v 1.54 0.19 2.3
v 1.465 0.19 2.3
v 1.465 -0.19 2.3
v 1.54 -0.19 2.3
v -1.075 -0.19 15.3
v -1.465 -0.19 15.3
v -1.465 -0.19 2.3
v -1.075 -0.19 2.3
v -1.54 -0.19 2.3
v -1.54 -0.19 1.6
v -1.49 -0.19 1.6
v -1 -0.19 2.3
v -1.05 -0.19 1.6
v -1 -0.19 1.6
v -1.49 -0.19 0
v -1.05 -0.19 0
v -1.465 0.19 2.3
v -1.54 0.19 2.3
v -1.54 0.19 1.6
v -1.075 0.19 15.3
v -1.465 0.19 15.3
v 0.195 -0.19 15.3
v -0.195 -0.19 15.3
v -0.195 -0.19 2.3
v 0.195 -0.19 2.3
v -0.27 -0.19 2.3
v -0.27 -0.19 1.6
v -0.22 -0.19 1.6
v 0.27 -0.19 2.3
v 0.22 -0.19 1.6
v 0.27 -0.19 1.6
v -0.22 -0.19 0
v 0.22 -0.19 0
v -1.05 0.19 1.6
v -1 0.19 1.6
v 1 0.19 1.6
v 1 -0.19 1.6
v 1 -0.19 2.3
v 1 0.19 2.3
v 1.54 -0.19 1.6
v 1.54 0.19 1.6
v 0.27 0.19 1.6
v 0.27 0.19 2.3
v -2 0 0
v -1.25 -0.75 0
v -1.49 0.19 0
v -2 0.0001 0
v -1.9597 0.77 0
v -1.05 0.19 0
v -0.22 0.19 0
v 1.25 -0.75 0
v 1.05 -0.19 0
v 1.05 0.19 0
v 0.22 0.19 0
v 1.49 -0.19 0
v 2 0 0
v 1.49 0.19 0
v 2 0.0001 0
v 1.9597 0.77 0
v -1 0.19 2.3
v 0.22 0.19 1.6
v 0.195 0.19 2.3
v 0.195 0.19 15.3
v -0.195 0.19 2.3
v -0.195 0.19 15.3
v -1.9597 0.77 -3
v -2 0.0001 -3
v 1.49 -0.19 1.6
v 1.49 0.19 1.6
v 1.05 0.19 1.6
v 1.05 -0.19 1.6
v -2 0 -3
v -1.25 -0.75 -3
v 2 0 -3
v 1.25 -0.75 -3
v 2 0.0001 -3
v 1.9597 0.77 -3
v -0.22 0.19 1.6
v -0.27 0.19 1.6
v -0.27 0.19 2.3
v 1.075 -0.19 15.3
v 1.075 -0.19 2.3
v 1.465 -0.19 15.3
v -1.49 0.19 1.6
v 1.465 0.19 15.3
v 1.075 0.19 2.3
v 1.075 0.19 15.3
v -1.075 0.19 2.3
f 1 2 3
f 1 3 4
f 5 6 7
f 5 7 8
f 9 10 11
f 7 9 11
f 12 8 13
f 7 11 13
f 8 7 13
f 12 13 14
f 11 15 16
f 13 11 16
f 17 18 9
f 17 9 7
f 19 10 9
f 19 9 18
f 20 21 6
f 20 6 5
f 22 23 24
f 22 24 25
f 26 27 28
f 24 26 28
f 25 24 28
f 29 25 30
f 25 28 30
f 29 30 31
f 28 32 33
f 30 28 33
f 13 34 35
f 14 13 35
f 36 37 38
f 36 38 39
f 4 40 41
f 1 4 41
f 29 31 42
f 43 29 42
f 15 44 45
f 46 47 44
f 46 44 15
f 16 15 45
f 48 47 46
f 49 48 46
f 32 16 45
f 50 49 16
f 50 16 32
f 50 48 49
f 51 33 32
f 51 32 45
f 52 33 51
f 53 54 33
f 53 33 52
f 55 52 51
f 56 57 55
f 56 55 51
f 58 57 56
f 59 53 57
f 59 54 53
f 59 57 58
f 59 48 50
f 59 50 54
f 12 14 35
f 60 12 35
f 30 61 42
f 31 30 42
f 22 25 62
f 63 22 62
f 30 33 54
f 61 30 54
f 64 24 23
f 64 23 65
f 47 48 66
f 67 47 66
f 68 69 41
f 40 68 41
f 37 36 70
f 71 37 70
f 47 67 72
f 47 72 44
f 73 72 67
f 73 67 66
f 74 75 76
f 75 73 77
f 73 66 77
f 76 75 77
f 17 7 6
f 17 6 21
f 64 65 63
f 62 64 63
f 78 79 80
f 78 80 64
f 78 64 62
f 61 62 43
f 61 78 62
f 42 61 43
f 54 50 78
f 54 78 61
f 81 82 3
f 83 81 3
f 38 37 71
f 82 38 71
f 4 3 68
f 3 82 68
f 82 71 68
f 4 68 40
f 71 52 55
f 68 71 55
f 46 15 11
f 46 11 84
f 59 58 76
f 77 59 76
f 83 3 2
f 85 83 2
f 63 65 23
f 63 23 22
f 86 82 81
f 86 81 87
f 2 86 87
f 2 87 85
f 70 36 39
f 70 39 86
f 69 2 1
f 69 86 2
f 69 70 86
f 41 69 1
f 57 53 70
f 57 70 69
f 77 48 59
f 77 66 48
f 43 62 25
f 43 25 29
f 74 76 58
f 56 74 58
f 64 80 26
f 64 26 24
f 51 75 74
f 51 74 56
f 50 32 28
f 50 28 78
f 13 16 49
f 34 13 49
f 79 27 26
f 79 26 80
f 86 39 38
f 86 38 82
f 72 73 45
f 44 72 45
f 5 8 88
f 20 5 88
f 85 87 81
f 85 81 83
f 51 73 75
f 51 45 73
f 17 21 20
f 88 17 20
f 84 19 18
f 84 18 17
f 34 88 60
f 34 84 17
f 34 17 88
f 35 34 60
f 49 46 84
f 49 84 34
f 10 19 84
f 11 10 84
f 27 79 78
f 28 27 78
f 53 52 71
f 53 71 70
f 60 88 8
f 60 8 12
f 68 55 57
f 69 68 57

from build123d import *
from OCP.BRepFilletAPI import BRepFilletAPI_MakeChamfer

# Parameters (mm, degrees)
SKETCH1_W           = 4
SKETCH1_H           = 3
BOSS_EXTRUDE1_DEPTH = 0.77
SKETCH3_W           = 4
SKETCH3_H           = 3
BOSS_EXTRUDE2_DEPTH = 0.75
CHAMFER1_SIZE       = 0.75
CHAMFER2_SIZE       = 0.77
CHAMFER2_SIZE_2     = 0.04035399
SKETCH4_W           = 0.44
SKETCH4_H           = 0.38
BOSS_EXTRUDE3_DEPTH = 1.6
SKETCH5_W           = 0.54
SKETCH5_H           = 0.38
BOSS_EXTRUDE4_DEPTH = 0.7
SKETCH6_W           = 0.39
SKETCH6_H           = 0.38
BOSS_EXTRUDE5_DEPTH = 13
LPATTERN1_COUNT     = 3
LPATTERN1_PITCH     = 1.27


with BuildPart() as part:
    # Sketch1 → Boss-Extrude1 (new body)
    with BuildSketch(Plane(origin=(0, 0, 0), x_dir=(1, 0, 0), z_dir=(0, 1, 0))):
        with Locations((0, 1.5)):
            Rectangle(SKETCH1_W, SKETCH1_H)
    extrude(amount=BOSS_EXTRUDE1_DEPTH)

    # Sketch3 → Boss-Extrude2 (add)
    with BuildSketch(Plane.XZ):
        with Locations((0, -1.5)):
            Rectangle(SKETCH3_W, SKETCH3_H)
    extrude(amount=BOSS_EXTRUDE2_DEPTH)

    # Chamfer1
    chamfer1_edges = [part.edges().sort_by_distance(p)[0] for p in [
        (-2, -0.75, -1.5),
        (2, -0.75, -1.5),
    ]]
    chamfer(chamfer1_edges, length=CHAMFER1_SIZE)

    # Chamfer2
    chamfer2_edges_1 = [part.edges().sort_by_distance(p)[0] for p in [
        (-2, 0.77, -1.5),
    ]]
    chamfer2_side_1 = [part.faces().sort_by_distance(p)[0] for p in [
        (-2, 0.76919292, -1.5),
    ]]
    chamfer2_edges_2 = [part.edges().sort_by_distance(p)[0] for p in [
        (2, 0.77, -1.5),
    ]]
    chamfer2_side_2 = [part.faces().sort_by_distance(p)[0] for p in [
        (1.99919292, 0.77, -1.5),
    ]]
    chamfer2 = BRepFilletAPI_MakeChamfer(part.part.solid().wrapped)
    for e in chamfer2_edges_1:
        chamfer2.Add(CHAMFER2_SIZE - 0.0001, CHAMFER2_SIZE_2 - 0.0001, e.wrapped, chamfer2_side_1[0].wrapped)
    for e in chamfer2_edges_2:
        chamfer2.Add(CHAMFER2_SIZE_2 - 0.0001, CHAMFER2_SIZE - 0.0001, e.wrapped, chamfer2_side_2[0].wrapped)
    add(Compound.cast(chamfer2.Shape()), mode=Mode.REPLACE)  # a hair under: the kernel refuses the full size

    # Sketch4 → Boss-Extrude3 (add)
    with BuildSketch(Plane.XY):
        with Locations((-1.27, 0)):
            Rectangle(SKETCH4_W, SKETCH4_H)
    boss_extrude3 = extrude(amount=BOSS_EXTRUDE3_DEPTH)

    # Sketch5 → Boss-Extrude4 (add)
    with BuildSketch(Plane.XY.offset(1.6)):
        with Locations((-1.27, 0)):
            Rectangle(SKETCH5_W, SKETCH5_H)
    boss_extrude4 = extrude(amount=BOSS_EXTRUDE4_DEPTH)

    # Sketch6 → Boss-Extrude5 (add)
    with BuildSketch(Plane.XY.offset(2.3)):
        with Locations((-1.27, 0)):
            Rectangle(SKETCH6_W, SKETCH6_H)
    boss_extrude5 = extrude(amount=BOSS_EXTRUDE5_DEPTH)

    # LPattern1: Boss-Extrude3, Boss-Extrude4, Boss-Extrude5 ×3
    with Locations(*[(i * LPATTERN1_PITCH, 0, 0) for i in range(1, LPATTERN1_COUNT)]):
        add(boss_extrude3)
        add(boss_extrude4)
        add(boss_extrude5)


solid = part.part
